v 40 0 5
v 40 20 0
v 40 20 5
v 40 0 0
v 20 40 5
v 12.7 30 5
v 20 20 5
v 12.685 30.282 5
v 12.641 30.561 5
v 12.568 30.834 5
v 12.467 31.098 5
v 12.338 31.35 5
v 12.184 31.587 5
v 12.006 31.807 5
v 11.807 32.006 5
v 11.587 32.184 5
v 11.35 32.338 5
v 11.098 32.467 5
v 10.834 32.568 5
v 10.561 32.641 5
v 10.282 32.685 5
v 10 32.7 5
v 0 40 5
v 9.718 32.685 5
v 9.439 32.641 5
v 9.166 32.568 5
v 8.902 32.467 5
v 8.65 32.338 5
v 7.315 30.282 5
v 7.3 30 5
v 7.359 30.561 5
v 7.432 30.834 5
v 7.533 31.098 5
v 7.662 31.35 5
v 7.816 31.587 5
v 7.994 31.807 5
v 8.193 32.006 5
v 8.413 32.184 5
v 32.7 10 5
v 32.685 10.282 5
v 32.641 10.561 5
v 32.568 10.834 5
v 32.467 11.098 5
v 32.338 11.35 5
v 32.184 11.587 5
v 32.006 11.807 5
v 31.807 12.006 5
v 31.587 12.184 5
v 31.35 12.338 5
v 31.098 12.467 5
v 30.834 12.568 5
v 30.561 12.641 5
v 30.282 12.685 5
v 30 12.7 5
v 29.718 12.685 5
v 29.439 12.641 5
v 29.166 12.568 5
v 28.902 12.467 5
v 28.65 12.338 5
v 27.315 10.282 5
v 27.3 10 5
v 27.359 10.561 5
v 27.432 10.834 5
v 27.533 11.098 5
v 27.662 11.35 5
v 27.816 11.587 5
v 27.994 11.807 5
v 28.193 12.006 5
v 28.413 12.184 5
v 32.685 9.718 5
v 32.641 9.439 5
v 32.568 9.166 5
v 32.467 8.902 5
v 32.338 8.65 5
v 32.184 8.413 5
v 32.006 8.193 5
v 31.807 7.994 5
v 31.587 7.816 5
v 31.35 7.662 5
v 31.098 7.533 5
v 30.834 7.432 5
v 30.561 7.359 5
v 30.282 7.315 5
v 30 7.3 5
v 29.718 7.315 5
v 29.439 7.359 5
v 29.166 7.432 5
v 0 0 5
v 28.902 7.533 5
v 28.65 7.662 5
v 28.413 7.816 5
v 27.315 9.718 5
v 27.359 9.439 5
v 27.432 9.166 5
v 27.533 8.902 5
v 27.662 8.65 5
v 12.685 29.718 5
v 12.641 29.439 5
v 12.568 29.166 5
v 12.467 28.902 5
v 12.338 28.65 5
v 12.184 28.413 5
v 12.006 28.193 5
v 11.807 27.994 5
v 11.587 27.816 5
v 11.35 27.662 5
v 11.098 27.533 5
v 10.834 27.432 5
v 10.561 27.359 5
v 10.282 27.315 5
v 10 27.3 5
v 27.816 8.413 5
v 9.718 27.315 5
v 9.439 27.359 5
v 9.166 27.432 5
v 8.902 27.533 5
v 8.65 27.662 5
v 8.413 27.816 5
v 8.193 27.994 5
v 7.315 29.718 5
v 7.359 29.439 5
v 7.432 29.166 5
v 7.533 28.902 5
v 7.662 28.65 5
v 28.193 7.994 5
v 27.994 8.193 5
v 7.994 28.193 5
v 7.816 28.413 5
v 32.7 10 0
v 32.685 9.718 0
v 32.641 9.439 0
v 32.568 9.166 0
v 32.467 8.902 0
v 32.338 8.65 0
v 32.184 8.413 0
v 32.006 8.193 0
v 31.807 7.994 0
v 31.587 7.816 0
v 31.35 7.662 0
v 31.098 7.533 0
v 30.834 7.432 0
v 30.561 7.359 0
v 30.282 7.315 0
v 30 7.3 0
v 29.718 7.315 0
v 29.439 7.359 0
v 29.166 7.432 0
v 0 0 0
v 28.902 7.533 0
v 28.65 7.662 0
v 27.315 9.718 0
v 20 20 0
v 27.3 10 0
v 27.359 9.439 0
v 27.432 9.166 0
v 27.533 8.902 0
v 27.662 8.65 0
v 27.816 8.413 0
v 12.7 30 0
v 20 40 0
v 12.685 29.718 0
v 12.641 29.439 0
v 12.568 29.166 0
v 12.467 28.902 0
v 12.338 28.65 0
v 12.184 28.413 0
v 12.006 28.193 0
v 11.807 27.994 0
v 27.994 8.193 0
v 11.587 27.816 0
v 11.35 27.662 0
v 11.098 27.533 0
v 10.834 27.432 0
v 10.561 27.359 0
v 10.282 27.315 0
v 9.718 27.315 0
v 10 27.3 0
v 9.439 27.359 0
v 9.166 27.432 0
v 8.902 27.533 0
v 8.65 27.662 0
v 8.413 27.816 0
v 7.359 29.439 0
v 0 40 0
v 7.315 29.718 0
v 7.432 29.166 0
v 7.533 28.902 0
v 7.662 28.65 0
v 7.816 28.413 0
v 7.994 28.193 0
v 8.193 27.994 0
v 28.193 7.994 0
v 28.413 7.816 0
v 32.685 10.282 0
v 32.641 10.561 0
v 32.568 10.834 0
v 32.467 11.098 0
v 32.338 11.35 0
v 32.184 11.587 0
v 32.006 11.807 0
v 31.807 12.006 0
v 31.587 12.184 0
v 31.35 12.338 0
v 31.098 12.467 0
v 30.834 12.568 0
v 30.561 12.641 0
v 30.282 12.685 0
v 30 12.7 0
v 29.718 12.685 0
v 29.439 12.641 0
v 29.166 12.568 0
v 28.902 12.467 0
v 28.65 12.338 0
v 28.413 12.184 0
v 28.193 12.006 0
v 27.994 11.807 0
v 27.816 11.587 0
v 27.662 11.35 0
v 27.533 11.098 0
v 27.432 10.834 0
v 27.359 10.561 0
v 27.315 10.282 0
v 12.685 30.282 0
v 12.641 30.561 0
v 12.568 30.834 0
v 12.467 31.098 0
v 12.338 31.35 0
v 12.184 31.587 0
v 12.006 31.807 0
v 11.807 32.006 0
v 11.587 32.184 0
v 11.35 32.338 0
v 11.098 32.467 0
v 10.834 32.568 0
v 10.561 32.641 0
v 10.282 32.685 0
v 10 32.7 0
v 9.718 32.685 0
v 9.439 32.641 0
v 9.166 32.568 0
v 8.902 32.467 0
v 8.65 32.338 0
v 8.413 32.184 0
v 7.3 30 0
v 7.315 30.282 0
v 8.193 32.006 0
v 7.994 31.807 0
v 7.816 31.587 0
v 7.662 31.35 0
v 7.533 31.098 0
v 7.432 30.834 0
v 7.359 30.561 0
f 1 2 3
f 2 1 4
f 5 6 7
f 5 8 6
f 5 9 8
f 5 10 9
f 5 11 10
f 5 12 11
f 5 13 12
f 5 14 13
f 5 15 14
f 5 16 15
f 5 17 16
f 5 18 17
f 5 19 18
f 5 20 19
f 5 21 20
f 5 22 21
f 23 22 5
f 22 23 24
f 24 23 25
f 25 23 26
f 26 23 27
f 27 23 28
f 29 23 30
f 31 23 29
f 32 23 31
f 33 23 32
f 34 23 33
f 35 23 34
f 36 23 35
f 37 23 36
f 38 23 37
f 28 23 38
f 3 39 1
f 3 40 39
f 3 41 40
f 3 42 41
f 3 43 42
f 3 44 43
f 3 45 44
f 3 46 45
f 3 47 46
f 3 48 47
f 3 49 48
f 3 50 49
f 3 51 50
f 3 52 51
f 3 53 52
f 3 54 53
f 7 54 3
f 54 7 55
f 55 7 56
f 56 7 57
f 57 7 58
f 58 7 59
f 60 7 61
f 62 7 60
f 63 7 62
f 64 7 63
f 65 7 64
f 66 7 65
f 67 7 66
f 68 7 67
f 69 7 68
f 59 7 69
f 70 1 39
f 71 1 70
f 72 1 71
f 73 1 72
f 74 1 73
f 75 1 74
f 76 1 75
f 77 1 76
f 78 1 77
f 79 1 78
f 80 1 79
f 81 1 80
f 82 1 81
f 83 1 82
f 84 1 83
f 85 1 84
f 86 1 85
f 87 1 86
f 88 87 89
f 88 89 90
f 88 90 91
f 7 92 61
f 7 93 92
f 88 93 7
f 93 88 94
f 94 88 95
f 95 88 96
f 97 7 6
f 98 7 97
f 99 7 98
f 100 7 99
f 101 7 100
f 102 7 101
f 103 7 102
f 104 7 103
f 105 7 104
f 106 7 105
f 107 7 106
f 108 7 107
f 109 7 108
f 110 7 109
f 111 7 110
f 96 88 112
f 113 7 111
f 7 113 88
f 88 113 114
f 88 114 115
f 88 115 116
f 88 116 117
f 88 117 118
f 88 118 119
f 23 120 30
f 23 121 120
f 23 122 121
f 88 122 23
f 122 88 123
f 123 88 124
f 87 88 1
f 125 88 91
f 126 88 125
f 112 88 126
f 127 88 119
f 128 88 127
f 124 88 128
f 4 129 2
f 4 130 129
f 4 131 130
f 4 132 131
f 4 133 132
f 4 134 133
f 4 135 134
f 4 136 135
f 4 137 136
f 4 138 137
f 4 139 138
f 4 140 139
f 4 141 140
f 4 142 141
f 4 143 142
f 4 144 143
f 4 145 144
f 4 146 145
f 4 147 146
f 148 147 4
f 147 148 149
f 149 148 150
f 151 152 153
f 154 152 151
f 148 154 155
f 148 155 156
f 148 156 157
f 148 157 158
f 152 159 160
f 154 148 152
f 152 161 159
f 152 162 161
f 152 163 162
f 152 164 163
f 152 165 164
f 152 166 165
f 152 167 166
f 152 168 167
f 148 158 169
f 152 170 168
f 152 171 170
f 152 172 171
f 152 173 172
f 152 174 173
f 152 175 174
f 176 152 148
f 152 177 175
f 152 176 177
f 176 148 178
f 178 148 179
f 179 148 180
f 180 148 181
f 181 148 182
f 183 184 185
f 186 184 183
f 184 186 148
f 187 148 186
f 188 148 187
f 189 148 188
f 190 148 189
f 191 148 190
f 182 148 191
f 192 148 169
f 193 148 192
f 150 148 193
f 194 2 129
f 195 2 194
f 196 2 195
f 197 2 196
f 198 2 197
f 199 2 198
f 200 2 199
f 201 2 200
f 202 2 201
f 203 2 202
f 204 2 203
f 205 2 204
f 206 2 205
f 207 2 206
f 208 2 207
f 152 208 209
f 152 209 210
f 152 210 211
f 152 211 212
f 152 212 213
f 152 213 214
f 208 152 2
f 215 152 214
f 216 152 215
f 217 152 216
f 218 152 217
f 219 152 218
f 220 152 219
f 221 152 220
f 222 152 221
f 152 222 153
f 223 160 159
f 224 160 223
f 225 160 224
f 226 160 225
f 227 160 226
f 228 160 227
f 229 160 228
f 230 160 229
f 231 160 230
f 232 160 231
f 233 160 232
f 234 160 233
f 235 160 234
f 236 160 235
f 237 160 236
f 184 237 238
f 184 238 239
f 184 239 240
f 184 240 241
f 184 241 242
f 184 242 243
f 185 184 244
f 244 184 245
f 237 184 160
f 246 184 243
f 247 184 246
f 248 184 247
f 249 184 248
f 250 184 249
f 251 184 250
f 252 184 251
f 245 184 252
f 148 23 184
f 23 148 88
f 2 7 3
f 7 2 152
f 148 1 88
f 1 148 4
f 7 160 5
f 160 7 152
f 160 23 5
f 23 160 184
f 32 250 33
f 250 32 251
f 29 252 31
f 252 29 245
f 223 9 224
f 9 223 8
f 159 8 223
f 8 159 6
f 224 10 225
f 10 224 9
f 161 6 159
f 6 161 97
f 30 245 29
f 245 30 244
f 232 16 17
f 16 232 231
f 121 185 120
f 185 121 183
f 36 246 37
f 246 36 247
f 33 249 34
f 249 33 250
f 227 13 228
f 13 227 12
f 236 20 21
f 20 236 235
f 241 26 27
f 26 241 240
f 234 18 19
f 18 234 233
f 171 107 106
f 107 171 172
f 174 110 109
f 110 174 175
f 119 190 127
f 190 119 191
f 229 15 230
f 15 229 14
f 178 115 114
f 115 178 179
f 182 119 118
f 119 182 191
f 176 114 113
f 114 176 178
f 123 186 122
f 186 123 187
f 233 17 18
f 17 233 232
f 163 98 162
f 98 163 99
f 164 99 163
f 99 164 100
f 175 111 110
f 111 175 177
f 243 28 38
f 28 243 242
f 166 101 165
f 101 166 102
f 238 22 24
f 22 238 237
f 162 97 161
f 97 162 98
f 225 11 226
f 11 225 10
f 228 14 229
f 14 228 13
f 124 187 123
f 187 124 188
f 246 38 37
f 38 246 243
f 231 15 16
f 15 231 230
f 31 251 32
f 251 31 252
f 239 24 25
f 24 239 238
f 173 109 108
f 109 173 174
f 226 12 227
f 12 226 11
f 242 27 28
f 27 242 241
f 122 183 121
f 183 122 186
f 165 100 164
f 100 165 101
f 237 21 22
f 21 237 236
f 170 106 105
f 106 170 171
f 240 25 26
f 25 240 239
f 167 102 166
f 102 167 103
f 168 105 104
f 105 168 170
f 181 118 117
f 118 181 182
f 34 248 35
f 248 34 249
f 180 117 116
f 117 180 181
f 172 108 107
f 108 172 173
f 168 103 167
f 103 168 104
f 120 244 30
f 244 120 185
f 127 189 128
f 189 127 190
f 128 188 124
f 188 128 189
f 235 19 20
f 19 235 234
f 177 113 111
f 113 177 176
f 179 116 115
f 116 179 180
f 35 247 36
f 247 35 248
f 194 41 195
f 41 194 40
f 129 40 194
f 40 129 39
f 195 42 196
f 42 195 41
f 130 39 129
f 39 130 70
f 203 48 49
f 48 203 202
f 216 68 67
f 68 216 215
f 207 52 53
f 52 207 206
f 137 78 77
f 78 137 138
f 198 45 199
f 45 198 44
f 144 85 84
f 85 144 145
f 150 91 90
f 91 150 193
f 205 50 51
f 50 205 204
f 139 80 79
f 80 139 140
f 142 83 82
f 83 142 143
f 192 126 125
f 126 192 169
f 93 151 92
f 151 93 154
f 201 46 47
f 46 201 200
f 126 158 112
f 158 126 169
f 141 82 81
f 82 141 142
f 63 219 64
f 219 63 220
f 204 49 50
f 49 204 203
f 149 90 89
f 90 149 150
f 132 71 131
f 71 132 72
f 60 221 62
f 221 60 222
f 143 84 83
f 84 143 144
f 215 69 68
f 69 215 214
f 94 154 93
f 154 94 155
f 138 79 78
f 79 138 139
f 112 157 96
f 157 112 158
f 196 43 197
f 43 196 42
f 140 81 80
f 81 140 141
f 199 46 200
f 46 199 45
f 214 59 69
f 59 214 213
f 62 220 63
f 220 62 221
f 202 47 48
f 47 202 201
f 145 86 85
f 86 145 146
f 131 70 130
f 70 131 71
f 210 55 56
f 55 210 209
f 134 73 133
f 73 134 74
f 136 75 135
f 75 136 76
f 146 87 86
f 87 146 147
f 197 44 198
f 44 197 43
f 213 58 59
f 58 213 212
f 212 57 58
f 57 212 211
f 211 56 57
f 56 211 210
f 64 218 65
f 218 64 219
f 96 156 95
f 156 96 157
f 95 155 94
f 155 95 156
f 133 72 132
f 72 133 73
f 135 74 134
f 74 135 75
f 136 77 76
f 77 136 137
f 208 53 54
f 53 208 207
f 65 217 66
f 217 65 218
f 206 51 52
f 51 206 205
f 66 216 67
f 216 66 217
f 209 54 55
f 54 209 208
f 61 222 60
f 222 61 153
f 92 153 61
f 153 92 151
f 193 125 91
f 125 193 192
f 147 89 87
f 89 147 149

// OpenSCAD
// V-slot corner connector.
$fn = 60;
eps = 0.02;
profile = 20;
arm = 40;
plate_t = 5;
difference() {
    union() { cube([arm,profile,plate_t]); cube([profile,arm,plate_t]); }
    for (p=[[profile/2,arm-profile/2],[arm-profile/2,profile/2]]) translate([p[0],p[1],-eps]) cylinder(d=5.4,h=plate_t+2*eps);
}
